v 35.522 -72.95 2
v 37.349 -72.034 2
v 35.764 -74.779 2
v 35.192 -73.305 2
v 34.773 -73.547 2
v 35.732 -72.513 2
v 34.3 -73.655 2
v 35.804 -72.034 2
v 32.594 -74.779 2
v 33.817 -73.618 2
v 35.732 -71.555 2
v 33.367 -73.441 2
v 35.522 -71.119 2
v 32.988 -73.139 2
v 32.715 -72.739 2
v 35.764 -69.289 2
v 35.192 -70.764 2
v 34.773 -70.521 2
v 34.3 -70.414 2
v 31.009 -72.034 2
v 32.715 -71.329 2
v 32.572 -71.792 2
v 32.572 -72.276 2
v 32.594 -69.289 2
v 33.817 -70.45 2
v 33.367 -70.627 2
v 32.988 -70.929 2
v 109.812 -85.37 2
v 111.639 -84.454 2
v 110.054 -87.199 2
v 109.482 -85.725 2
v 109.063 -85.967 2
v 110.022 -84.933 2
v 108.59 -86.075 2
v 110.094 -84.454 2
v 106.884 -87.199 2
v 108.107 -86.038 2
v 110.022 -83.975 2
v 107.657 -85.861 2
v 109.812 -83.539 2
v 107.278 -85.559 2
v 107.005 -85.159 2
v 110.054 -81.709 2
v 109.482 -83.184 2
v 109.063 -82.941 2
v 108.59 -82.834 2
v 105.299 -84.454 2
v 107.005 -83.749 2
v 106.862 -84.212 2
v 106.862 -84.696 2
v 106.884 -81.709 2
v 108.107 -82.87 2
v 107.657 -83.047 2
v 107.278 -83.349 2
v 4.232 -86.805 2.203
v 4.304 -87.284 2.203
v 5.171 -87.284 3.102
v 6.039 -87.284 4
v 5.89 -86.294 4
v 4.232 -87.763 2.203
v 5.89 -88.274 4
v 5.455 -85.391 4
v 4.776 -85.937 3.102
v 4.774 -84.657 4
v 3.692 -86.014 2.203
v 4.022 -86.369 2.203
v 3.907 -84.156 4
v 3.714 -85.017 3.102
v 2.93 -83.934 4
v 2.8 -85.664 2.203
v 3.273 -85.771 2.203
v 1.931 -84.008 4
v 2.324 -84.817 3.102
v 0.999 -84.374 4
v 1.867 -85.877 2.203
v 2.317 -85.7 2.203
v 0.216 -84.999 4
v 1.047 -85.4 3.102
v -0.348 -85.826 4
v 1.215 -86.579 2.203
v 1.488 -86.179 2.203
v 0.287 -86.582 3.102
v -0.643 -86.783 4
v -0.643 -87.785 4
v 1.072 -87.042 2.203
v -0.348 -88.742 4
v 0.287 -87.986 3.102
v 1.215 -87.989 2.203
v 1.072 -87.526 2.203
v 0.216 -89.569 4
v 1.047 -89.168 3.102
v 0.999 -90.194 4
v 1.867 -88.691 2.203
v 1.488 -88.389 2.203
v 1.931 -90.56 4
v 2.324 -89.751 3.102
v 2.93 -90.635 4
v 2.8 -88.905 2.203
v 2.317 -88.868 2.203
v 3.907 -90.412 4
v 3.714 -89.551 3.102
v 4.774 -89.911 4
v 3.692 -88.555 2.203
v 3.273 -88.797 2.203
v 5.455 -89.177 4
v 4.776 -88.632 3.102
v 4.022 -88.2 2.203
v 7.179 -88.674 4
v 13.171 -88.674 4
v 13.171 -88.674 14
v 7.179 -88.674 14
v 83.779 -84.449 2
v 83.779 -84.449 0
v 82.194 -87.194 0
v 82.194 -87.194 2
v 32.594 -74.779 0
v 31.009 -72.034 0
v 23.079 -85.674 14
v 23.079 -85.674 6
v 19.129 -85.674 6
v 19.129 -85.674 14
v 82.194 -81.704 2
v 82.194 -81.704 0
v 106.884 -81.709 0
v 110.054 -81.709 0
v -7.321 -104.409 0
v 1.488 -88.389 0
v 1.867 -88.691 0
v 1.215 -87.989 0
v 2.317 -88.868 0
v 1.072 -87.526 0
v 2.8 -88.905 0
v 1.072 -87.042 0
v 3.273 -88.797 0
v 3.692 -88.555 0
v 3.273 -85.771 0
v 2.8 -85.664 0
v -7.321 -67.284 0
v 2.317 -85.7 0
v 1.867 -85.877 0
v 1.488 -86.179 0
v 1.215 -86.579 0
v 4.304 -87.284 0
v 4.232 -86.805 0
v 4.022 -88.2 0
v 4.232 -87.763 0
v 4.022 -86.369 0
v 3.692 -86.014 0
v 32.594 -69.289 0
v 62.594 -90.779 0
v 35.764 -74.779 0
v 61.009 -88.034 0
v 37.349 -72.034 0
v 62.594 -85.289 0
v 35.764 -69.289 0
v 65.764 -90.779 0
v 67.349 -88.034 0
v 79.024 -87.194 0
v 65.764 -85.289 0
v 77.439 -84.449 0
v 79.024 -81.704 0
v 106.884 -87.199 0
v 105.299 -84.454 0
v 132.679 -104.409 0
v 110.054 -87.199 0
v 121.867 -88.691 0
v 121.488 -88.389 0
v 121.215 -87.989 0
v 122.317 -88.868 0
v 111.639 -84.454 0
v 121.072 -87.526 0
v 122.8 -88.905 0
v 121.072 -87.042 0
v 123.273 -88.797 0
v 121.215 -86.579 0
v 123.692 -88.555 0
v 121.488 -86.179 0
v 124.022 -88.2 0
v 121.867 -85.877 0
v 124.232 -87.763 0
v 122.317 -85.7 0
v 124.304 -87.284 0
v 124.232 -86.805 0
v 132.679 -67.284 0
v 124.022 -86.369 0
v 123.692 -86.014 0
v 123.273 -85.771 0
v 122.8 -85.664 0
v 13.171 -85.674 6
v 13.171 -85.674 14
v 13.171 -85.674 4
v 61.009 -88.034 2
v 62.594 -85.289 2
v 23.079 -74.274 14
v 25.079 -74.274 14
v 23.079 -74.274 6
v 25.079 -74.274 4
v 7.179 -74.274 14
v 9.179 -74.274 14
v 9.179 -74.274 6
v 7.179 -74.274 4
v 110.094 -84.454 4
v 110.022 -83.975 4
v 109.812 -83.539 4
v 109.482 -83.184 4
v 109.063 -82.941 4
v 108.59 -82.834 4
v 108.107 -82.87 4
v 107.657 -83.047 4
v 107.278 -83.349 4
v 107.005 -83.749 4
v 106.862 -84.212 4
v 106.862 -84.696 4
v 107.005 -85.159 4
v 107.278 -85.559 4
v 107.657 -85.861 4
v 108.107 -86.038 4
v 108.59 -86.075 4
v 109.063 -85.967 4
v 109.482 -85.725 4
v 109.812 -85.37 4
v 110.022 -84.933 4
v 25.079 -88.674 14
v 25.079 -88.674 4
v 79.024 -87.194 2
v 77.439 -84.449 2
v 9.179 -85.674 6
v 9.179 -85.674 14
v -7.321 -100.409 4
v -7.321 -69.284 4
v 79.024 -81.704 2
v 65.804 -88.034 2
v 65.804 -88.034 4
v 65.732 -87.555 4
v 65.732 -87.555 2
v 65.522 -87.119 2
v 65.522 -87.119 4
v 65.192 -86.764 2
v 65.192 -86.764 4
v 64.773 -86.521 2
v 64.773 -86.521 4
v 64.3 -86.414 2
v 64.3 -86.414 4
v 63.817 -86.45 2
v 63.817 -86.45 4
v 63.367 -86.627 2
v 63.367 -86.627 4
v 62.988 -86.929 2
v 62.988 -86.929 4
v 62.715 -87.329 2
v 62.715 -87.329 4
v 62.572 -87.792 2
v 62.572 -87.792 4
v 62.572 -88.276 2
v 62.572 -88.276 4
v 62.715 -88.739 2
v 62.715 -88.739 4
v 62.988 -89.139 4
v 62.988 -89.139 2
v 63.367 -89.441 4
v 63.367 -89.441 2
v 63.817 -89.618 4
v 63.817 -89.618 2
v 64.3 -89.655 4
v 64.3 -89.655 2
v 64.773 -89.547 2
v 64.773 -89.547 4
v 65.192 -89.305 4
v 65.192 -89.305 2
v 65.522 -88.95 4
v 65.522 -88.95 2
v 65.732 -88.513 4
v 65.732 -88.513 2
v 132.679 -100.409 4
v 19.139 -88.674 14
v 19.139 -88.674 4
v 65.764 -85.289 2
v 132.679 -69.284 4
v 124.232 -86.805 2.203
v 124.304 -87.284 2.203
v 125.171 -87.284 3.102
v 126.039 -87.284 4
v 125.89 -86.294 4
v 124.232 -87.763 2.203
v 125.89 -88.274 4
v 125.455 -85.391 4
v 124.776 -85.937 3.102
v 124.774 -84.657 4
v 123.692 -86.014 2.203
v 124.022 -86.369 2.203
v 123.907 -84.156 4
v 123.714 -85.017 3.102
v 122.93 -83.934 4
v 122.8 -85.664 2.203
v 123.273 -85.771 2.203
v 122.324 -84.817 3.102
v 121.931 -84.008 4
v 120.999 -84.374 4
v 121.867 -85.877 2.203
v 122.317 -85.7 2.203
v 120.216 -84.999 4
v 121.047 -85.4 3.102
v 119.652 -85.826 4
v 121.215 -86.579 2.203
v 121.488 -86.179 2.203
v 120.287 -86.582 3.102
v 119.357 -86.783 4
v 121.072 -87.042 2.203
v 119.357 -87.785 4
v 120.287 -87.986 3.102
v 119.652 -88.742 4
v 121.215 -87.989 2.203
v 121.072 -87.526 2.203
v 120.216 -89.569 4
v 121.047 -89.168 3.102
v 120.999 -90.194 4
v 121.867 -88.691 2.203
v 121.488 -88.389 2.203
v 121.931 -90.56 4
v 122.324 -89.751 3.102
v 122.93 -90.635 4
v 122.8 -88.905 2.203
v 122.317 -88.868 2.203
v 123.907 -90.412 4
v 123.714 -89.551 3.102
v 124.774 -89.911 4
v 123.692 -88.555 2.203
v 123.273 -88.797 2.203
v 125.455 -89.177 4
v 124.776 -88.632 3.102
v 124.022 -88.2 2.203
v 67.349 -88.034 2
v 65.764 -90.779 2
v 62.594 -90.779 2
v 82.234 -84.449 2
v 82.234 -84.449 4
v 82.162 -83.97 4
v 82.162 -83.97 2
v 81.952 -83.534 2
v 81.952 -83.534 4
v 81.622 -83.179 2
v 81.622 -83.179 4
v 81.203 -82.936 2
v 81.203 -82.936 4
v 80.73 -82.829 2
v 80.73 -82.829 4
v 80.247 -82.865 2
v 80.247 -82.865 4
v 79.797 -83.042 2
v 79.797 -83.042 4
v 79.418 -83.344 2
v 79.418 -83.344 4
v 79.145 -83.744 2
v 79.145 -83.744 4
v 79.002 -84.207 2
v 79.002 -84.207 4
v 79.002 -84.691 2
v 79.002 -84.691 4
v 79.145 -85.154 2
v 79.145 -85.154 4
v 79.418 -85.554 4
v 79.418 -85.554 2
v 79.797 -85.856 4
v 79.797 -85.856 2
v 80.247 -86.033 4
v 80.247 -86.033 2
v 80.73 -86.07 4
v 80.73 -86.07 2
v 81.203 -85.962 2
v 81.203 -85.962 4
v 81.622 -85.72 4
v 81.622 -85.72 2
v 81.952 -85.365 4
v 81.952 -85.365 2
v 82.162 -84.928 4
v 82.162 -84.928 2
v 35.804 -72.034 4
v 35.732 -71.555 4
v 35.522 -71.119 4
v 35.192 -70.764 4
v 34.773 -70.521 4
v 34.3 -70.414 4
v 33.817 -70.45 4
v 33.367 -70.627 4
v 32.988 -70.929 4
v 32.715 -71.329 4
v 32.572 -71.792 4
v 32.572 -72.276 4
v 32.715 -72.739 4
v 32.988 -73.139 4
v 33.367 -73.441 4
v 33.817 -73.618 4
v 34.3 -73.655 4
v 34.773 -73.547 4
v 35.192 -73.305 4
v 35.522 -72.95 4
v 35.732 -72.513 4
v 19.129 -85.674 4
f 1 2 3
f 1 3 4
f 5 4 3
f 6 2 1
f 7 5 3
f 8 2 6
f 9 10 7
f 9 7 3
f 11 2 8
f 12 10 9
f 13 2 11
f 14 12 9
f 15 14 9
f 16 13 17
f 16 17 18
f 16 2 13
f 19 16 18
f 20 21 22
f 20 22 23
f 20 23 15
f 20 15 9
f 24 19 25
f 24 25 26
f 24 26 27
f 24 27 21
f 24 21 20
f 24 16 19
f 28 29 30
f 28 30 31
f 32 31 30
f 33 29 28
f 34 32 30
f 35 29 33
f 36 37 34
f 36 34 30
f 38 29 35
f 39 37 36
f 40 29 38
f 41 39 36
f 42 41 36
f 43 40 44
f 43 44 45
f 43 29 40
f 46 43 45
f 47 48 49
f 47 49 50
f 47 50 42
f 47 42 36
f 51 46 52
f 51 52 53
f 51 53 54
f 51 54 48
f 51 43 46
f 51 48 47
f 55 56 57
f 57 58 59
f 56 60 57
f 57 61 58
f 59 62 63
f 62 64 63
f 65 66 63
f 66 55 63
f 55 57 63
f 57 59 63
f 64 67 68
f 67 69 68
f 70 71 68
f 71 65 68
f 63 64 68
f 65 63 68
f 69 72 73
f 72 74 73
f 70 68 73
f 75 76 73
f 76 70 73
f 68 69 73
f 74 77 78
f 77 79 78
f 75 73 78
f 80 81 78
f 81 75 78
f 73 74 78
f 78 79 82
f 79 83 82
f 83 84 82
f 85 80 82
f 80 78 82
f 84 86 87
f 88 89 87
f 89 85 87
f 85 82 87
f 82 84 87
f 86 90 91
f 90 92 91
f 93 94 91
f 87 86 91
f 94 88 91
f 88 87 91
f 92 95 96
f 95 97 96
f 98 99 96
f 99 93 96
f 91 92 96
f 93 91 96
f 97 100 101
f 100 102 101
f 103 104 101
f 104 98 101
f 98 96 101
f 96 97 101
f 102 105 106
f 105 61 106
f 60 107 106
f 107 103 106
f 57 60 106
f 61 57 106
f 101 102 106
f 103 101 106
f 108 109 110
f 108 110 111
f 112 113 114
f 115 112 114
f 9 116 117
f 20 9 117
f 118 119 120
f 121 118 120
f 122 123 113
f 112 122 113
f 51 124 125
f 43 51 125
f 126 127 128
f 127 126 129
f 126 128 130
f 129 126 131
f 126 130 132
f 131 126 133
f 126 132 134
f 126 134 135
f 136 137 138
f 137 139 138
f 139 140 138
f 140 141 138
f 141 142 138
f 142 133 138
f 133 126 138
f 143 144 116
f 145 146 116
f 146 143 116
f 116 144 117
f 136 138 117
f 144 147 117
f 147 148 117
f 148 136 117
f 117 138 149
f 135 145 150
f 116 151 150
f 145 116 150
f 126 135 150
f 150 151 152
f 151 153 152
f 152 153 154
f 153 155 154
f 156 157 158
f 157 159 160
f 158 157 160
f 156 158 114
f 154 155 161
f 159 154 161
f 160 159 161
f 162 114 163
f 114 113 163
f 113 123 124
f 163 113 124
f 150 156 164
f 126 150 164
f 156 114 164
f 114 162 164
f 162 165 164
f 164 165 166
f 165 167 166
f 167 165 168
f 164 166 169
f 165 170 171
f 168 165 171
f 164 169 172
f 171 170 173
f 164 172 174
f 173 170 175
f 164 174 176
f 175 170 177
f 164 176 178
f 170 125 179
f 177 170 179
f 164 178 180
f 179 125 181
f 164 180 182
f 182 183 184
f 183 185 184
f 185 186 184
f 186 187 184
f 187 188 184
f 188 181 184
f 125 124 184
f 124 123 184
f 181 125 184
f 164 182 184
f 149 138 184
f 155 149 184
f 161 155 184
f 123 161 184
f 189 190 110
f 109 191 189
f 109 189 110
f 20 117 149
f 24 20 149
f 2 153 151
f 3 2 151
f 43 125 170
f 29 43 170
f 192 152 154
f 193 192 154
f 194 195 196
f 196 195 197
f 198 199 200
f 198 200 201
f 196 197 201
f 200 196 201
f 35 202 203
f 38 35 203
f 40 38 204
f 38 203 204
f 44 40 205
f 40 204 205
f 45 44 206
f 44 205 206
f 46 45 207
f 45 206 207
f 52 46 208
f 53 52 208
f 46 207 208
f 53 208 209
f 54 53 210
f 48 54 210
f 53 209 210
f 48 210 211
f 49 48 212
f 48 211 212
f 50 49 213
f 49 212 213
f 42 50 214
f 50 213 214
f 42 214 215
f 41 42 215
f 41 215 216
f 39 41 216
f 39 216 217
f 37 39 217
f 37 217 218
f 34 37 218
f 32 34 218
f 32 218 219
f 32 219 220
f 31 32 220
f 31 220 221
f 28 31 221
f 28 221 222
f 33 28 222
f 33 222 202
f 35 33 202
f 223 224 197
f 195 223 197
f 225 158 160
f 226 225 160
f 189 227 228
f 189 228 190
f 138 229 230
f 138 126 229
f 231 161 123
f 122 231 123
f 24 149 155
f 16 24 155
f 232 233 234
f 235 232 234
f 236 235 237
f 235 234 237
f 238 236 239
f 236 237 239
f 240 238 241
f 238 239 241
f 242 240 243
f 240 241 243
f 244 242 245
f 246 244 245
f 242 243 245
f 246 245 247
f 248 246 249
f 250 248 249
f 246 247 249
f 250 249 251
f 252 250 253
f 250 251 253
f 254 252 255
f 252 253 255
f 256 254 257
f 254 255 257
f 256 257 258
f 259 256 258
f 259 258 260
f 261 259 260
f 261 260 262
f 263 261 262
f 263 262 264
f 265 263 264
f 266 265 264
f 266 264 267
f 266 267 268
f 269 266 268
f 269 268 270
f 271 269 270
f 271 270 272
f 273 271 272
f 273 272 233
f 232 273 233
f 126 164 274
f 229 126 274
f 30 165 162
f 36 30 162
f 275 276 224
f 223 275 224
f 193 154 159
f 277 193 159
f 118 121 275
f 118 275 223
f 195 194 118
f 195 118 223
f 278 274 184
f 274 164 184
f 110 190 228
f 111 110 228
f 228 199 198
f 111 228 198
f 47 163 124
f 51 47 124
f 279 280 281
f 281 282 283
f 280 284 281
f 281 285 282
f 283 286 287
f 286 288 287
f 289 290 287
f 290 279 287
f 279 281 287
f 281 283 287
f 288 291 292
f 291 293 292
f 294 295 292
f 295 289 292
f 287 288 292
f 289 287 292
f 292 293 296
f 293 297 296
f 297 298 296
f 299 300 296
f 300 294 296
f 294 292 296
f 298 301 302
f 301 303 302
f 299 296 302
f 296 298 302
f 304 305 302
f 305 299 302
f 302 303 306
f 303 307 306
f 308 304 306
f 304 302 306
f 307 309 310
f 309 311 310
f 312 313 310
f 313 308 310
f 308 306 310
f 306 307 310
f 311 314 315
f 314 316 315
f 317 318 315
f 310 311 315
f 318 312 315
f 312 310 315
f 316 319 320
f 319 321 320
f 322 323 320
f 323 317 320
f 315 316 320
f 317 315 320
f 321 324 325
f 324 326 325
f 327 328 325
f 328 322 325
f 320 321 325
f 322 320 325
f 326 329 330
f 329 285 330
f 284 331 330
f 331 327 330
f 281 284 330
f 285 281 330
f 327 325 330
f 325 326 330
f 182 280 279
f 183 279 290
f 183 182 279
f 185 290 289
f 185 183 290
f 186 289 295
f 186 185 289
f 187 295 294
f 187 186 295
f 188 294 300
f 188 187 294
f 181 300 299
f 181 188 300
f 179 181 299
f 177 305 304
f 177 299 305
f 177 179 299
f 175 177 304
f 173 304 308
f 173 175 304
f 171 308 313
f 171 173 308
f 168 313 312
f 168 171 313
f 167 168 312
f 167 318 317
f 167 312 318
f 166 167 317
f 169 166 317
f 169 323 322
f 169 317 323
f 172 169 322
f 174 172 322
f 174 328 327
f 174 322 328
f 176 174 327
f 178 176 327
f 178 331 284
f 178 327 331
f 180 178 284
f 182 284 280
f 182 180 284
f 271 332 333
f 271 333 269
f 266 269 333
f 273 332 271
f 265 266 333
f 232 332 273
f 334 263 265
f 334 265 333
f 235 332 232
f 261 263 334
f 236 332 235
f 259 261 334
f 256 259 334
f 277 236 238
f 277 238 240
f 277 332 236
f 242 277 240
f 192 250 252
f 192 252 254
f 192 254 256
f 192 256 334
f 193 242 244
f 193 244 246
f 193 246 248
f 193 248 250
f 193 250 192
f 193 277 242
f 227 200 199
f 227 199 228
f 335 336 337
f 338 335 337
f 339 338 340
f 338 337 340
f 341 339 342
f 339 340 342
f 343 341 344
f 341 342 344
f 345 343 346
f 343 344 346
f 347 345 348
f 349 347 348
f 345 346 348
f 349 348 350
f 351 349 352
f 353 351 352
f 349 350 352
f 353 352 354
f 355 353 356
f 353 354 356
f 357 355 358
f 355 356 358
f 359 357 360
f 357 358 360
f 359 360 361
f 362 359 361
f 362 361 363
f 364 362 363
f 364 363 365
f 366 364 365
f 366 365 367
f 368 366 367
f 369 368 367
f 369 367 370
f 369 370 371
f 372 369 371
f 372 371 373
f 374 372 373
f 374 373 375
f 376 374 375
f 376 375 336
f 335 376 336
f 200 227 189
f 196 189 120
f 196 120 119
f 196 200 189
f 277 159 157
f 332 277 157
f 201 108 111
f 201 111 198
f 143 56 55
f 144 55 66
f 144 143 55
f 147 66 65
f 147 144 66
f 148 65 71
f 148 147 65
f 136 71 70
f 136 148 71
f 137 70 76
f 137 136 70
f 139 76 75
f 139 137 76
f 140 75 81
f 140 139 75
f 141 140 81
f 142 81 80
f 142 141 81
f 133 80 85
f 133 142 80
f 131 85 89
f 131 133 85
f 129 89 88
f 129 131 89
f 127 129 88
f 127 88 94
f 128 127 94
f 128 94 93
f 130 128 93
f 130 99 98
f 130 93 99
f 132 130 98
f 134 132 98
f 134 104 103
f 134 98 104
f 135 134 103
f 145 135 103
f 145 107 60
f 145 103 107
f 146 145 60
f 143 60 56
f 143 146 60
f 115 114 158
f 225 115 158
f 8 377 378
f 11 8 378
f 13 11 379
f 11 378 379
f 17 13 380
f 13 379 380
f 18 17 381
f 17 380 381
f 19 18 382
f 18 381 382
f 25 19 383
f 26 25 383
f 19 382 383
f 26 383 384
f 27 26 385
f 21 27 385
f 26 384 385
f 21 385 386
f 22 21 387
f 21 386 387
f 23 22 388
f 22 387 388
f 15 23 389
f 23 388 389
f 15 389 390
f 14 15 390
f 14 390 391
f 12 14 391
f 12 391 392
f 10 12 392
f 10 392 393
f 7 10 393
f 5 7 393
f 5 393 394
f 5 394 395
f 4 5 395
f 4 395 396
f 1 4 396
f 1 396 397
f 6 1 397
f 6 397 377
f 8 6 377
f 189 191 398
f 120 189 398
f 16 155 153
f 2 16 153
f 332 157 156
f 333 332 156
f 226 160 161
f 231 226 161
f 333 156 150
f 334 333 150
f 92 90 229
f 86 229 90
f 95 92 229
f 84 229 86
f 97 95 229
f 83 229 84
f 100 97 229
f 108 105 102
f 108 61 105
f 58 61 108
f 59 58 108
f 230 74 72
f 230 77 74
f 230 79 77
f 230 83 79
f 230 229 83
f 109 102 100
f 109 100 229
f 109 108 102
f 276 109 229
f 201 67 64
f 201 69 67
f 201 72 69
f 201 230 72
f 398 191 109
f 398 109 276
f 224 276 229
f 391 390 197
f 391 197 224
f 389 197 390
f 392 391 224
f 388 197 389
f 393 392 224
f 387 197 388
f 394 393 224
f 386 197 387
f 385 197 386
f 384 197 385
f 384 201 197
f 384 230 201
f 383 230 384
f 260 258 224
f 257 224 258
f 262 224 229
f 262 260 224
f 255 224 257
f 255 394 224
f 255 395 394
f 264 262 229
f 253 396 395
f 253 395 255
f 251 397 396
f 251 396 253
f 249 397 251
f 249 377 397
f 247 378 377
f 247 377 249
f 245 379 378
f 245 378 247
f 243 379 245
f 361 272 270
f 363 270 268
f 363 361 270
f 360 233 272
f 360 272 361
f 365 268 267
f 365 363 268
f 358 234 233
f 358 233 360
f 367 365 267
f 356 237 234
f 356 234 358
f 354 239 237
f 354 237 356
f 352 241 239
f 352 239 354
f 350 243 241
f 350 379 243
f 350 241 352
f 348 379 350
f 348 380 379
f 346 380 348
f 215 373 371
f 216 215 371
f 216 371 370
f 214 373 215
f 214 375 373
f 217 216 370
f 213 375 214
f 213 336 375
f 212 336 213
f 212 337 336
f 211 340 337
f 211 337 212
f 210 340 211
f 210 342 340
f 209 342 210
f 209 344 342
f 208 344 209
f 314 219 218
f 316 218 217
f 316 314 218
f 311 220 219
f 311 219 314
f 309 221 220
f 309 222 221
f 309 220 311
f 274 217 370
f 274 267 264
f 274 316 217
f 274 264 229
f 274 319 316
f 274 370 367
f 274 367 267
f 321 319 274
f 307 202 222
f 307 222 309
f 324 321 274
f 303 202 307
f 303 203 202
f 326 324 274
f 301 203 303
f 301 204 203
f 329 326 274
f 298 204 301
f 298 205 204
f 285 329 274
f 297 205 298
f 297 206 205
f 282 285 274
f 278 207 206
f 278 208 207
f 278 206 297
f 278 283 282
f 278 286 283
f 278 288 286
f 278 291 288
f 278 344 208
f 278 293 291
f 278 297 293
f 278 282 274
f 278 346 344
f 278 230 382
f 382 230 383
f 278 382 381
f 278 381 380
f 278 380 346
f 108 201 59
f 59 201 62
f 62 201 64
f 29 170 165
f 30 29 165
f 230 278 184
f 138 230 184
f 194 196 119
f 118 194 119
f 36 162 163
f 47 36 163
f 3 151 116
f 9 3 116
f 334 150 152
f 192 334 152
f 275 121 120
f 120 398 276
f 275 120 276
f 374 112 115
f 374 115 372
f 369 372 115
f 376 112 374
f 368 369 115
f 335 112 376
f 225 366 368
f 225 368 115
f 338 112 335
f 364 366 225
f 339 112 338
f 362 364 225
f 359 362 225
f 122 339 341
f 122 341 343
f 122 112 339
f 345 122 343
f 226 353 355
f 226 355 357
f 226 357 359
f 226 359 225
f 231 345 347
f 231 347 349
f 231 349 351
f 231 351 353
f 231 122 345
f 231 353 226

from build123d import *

# Parameters (mm, degrees)
CROQUIS1_W                      = 140
CROQUIS1_H                      = 37.125
CROQUIS1_R                      = 1.625
SALIENTE_EXTRUIR1_DEPTH         = 4
CROQUIS2_R                      = 3.35997123
CORTAR_EXTRUIR1_DEPTH           = 1.8
CORTAR_EXTRUIR1_DRAFT           = -44
CORTAR_EXTRUIR1_PROFILE_2_DEPTH = 1.8
CORTAR_EXTRUIR1_PROFILE_2_DRAFT = -44
CROQUIS3_R                      = 1.625
CORTAR_EXTRUIR2_DEPTH           = 4
SALIENTE_EXTRUIR2_DEPTH         = 10
CROQUIS6_W                      = 13.9
CROQUIS6_H                      = 11.4
SALIENTE_EXTRUIR4_DEPTH         = 2
CORTAR_EXTRUIR3_DEPTH           = 2
CORTAR_EXTRUIR4_START           = -140
CORTAR_EXTRUIR4_DEPTH           = 140


with BuildPart() as part:
    # Croquis1 → Saliente-Extruir1 (new body)
    with BuildSketch(Plane.XY):
        with Locations((62.679008317, -85.846623552)):
            Rectangle(CROQUIS1_W, CROQUIS1_H)
        with Locations((122.679008317, -87.284123552)):
            Circle(CROQUIS1_R, mode=Mode.SUBTRACT)
        with Locations((2.679008317, -87.284123552)):
            Circle(CROQUIS1_R, mode=Mode.SUBTRACT)
    extrude(amount=SALIENTE_EXTRUIR1_DEPTH)


with BuildPart() as cortar_extruir1_tool:
    # Croquis2 → Cortar-Extruir1 (with draft: the straight prism first)
    with BuildSketch(Plane.XY.offset(4)):
        with Locations((2.679008317, -87.284123552)):
            Circle(CROQUIS2_R)
    extrude(amount=-CORTAR_EXTRUIR1_DEPTH)
    # Cortar-Extruir1: the draft: its side faces are tilted about the plane it starts from
    cortar_extruir1_sides = [cortar_extruir1_tool.faces().sort_by_distance(p)[0] for p in [
        (-0.680962913, -87.284123552, 3.1),
    ]]
    draft(cortar_extruir1_sides, Plane.XY.offset(4), CORTAR_EXTRUIR1_DRAFT)


with BuildPart() as part_1:
    add(part.part)

    # Cortar-Extruir1: cut by cortar_extruir1_tool
    add(cortar_extruir1_tool.part, mode=Mode.SUBTRACT)


with BuildPart() as cortar_extruir1_profile_2_tool:
    # Croquis2 → Cortar-Extruir1 profile 2 (with draft: the straight prism first)
    with BuildSketch(Plane.XY.offset(4)):
        with Locations((122.679008317, -87.284123552)):
            Circle(CROQUIS2_R)
    extrude(amount=-CORTAR_EXTRUIR1_PROFILE_2_DEPTH)
    # Cortar-Extruir1 profile 2: the draft: its side faces are tilted about the plane it starts from
    cortar_extruir1_profile_2_sides = [cortar_extruir1_profile_2_tool.faces().sort_by_distance(p)[0] for p in [
        (119.319037087, -87.284123552, 3.1),
    ]]
    draft(cortar_extruir1_profile_2_sides, Plane.XY.offset(4), CORTAR_EXTRUIR1_PROFILE_2_DRAFT)


with BuildPart() as part_2:
    add(part_1.part)

    # Cortar-Extruir1 profile 2: cut by cortar_extruir1_profile_2_tool
    add(cortar_extruir1_profile_2_tool.part, mode=Mode.SUBTRACT)

    # Croquis3 → Cortar-Extruir2 (cut)
    with BuildSketch(Plane.XY.offset(4)):
        with Locations((80.609008317, -84.449123552)):
            Circle(CROQUIS3_R)
        with Locations((108.469008317, -84.454123552)):
            Circle(CROQUIS3_R)
        with Locations((34.179008317, -72.034123552)):
            Circle(CROQUIS3_R)
        with Locations((64.179008317, -88.034123552)):
            Circle(CROQUIS3_R)
    extrude(amount=-CORTAR_EXTRUIR2_DEPTH, mode=Mode.SUBTRACT)

    # Croquis4 → Saliente-Extruir2 (add)
    with BuildSketch(Plane.XY.offset(4)):
        Polygon((13.170968426, -85.674315594), (13.170968426, -88.674315594), (7.179008317, -88.674315594), (7.179008317, -74.274315594), (9.179008317, -74.274315594), (9.179008317, -85.674315594), align=None)
        Polygon((19.129008317, -85.674315594), (19.138778044, -88.674315594), (25.079008317, -88.674315594), (25.079008317, -74.274315594), (23.079008317, -74.274315594), (23.079008317, -85.674315594), align=None)
    extrude(amount=SALIENTE_EXTRUIR2_DEPTH)

    # Croquis6 → Saliente-Extruir4 (add)
    with BuildSketch(Plane.XY.offset(4)):
        with Locations((16.129008317, -79.974315594)):
            Rectangle(CROQUIS6_W, CROQUIS6_H)
    extrude(amount=SALIENTE_EXTRUIR4_DEPTH)

    # Croquis8 → Cortar-Extruir3 (cut)
    with BuildSketch(Plane(origin=(0, 0, 0), x_dir=(-1, 0, 0), z_dir=(0, 0, -1))):
        Polygon((-105.299008317, -84.454123552), (-106.884008317, -81.708823022), (-110.054008317, -81.708823022), (-111.639008317, -84.454123552), (-110.054008317, -87.199424082), (-106.884008317, -87.199424082), align=None)
        Polygon((-61.009008317, -88.034123552), (-62.594008317, -85.288823022), (-65.764008317, -85.288823022), (-67.349008317, -88.034123552), (-65.764008317, -90.779424082), (-62.594008317, -90.779424082), align=None)
        Polygon((-77.439008317, -84.449123552), (-79.024008317, -81.703823022), (-82.194008317, -81.703823022), (-83.779008317, -84.449123552), (-82.194008317, -87.194424082), (-79.024008317, -87.194424082), align=None)
        Polygon((-31.009008317, -72.034123552), (-32.594008317, -69.288823022), (-35.764008317, -69.288823022), (-37.349008317, -72.034123552), (-35.764008317, -74.779424082), (-32.594008317, -74.779424082), align=None)
    extrude(amount=-CORTAR_EXTRUIR3_DEPTH, mode=Mode.SUBTRACT)

    # Croquis9 → Cortar-Extruir4 (cut)
    with BuildSketch(Plane.ZY.offset(7.320991683).offset(CORTAR_EXTRUIR4_START)):
        Polygon((4, -104.409123552), (0, -104.409123552), (4, -100.409123552), align=None)
        Polygon((0, -67.284123552), (4, -67.284123552), (4, -69.284123552), align=None)
    extrude(amount=CORTAR_EXTRUIR4_DEPTH, mode=Mode.SUBTRACT)


solid = part_2.part
